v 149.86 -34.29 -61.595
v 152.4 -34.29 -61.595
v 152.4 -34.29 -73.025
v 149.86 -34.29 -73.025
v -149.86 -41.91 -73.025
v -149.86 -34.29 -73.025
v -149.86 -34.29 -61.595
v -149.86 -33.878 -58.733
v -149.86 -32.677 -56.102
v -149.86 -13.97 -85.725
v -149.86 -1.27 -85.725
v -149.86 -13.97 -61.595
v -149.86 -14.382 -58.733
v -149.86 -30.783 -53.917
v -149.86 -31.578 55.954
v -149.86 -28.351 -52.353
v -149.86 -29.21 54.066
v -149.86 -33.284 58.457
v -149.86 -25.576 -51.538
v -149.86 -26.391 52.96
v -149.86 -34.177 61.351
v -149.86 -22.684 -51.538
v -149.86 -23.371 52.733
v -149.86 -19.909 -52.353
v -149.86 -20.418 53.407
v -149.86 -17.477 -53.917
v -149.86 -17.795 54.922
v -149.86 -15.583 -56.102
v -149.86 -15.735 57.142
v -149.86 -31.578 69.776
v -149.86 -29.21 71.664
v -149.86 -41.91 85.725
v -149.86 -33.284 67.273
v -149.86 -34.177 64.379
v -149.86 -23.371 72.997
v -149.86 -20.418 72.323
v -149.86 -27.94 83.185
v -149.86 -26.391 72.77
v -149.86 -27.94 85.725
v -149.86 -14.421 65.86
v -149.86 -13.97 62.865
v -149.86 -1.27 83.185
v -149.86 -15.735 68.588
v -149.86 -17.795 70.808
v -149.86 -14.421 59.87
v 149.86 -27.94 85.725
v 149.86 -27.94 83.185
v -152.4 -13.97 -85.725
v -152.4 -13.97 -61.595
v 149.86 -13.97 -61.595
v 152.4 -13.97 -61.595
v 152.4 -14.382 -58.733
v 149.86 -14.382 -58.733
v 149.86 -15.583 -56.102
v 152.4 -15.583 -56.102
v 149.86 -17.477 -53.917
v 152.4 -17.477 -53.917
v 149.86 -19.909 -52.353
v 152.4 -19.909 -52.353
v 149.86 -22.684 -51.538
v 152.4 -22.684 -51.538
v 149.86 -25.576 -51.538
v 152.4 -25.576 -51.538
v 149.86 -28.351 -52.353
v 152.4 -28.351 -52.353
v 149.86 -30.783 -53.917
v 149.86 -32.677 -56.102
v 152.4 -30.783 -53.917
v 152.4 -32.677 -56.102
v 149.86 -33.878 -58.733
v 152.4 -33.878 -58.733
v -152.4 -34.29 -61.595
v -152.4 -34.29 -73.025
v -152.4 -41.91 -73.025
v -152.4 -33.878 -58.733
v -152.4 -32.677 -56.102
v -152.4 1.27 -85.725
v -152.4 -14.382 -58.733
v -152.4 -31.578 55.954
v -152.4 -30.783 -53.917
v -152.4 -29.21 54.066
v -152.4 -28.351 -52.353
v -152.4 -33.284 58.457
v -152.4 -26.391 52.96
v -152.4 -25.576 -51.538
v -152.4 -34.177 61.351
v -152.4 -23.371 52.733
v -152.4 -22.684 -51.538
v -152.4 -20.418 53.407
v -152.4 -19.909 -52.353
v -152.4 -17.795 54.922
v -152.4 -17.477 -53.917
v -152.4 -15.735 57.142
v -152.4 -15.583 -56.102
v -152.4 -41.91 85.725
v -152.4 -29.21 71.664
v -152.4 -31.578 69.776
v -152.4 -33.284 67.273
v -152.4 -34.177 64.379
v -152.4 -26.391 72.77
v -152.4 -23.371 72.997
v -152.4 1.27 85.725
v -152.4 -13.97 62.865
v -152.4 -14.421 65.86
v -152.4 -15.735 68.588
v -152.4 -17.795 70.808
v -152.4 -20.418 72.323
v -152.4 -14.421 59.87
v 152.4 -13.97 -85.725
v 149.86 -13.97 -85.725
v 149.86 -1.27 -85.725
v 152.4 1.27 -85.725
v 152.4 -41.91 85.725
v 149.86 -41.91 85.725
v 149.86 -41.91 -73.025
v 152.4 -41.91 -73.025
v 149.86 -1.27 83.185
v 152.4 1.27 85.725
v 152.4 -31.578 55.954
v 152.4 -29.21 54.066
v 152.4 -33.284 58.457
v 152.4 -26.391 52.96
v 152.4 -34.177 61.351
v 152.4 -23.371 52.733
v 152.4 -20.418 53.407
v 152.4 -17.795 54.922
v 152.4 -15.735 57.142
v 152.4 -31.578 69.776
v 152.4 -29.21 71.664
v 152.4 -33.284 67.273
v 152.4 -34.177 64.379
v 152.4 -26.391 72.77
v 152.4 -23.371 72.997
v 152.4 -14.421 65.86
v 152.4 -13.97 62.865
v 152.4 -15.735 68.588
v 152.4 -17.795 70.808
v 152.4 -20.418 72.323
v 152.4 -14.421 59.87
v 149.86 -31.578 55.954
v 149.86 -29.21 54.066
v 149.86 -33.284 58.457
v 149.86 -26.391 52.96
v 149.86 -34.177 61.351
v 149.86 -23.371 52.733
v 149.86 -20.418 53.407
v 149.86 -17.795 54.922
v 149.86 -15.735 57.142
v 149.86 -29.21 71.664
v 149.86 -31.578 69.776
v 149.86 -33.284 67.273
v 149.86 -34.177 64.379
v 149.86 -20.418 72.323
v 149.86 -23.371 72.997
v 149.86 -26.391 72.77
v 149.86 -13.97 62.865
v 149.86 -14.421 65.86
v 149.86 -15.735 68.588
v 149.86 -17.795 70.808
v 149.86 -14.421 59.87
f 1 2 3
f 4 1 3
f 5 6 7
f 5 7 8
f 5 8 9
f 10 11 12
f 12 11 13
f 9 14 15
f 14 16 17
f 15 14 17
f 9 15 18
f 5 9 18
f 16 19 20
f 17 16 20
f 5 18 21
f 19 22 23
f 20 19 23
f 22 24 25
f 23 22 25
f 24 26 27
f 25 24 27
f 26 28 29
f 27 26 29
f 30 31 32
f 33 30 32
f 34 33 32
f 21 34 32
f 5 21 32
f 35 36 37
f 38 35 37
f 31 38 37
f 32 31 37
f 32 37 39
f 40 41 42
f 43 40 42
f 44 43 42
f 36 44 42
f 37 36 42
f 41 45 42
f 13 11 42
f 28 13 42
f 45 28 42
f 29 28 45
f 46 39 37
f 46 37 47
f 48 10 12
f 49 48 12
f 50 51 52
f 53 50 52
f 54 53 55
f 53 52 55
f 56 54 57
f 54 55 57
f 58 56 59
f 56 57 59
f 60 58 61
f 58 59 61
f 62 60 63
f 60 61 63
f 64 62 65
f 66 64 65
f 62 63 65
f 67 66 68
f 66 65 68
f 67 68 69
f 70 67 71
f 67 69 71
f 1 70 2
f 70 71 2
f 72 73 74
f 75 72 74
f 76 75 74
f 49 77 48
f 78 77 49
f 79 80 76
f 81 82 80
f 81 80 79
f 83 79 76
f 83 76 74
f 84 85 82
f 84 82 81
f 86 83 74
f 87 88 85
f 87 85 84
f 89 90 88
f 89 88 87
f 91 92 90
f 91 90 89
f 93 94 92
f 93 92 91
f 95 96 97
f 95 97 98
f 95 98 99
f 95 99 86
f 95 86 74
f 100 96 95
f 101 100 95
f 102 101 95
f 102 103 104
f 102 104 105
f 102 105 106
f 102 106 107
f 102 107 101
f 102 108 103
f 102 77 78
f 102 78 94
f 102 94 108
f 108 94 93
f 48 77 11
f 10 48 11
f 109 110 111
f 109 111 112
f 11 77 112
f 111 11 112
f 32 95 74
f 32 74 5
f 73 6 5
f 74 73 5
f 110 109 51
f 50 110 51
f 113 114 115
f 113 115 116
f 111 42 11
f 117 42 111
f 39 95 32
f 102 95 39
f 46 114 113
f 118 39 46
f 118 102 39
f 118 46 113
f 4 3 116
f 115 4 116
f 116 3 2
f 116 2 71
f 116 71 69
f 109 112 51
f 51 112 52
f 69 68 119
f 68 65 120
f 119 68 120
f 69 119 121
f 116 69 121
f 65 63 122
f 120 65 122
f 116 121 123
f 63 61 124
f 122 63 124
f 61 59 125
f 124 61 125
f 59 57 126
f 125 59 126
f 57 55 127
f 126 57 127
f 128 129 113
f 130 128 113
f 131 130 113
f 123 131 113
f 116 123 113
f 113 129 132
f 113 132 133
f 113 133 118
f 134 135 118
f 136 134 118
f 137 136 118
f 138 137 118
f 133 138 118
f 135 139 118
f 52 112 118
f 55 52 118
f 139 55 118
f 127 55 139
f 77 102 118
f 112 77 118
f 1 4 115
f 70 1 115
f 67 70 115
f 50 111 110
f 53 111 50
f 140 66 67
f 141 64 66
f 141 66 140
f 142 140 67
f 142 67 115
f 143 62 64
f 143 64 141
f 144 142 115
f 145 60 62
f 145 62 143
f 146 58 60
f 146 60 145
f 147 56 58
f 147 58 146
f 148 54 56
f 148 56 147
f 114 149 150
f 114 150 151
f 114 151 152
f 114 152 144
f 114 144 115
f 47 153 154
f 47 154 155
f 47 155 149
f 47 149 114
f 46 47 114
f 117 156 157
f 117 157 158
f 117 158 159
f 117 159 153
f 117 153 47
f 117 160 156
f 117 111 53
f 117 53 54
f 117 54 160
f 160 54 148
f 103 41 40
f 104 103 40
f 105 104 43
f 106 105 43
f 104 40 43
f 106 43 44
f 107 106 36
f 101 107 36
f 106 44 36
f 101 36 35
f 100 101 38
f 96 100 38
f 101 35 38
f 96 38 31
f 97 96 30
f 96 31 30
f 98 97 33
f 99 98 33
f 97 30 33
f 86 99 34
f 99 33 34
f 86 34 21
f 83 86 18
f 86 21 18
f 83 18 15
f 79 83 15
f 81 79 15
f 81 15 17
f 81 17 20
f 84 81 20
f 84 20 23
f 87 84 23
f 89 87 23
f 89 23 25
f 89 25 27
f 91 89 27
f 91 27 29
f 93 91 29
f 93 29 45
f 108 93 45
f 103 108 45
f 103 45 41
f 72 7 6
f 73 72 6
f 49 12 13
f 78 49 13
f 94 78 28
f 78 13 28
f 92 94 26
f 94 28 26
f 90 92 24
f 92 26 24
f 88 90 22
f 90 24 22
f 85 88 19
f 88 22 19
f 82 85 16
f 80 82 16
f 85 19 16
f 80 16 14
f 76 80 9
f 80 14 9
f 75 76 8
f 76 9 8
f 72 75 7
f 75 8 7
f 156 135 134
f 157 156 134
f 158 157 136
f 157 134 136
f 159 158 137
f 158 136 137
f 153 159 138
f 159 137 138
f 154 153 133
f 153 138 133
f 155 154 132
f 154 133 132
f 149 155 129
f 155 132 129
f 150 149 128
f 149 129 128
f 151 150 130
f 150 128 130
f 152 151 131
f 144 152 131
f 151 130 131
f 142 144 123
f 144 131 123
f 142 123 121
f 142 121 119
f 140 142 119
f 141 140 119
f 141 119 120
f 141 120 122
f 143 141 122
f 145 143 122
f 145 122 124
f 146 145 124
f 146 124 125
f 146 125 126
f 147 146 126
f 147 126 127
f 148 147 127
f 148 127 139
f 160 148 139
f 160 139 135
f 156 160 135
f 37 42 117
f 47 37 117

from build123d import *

# Parameters (mm, degrees)
F0_W     = 304.8
F0_H     = 171.45
F1_DEPTH = 1.27
F2_W     = 304.8
F2_H     = 2.54
F3_DEPTH = 26.67
F4_W     = 2.54
F4_H     = 171.45
F5_DEPTH = 40.64
F6_R     = 10.16
F7_DEPTH = 304.801


with BuildPart() as f1:
    # F0 (on Front) → F1 (new body, symmetric)
    with BuildSketch(Plane.XZ):
        Rectangle(F0_W, F0_H)
    extrude(amount=F1_DEPTH, both=True)

    # F2 (on face) → F3 (join)
    with BuildSketch(Plane.XZ.offset(1.27)):
        with Locations((0, 84.455)):
            Rectangle(F2_W, F2_H)
    extrude(amount=F3_DEPTH)

    # F4 (on face) → F5 (join)
    with BuildSketch(Plane.XZ.offset(1.27)):
        with Locations((-151.13, 0)):
            Rectangle(F4_W, F4_H)
        with Locations((151.13, 0)):
            Rectangle(F4_W, F4_H)
    extrude(amount=F5_DEPTH)

    # F6 (on face) → F7 (cut, through all)
    with BuildSketch(Plane.YZ.offset(152.4)):
        with Locations((-24.13, 62.865)):
            Circle(F6_R)
        with BuildLine():
            Line((-34.29, -73.025), (-41.91, -73.025))
            Line((-41.91, -73.025), (-41.91, -85.725))
            Line((-41.91, -85.725), (-13.97, -85.725))
            Line((-13.97, -85.725), (-13.97, -61.595))
            ThreePointArc((-13.97, -61.595), (-24.13, -51.435), (-34.29, -61.595))
            Line((-34.29, -61.595), (-34.29, -73.025))
        make_face()
    extrude(amount=-F7_DEPTH, mode=Mode.SUBTRACT)


solid = f1.part
